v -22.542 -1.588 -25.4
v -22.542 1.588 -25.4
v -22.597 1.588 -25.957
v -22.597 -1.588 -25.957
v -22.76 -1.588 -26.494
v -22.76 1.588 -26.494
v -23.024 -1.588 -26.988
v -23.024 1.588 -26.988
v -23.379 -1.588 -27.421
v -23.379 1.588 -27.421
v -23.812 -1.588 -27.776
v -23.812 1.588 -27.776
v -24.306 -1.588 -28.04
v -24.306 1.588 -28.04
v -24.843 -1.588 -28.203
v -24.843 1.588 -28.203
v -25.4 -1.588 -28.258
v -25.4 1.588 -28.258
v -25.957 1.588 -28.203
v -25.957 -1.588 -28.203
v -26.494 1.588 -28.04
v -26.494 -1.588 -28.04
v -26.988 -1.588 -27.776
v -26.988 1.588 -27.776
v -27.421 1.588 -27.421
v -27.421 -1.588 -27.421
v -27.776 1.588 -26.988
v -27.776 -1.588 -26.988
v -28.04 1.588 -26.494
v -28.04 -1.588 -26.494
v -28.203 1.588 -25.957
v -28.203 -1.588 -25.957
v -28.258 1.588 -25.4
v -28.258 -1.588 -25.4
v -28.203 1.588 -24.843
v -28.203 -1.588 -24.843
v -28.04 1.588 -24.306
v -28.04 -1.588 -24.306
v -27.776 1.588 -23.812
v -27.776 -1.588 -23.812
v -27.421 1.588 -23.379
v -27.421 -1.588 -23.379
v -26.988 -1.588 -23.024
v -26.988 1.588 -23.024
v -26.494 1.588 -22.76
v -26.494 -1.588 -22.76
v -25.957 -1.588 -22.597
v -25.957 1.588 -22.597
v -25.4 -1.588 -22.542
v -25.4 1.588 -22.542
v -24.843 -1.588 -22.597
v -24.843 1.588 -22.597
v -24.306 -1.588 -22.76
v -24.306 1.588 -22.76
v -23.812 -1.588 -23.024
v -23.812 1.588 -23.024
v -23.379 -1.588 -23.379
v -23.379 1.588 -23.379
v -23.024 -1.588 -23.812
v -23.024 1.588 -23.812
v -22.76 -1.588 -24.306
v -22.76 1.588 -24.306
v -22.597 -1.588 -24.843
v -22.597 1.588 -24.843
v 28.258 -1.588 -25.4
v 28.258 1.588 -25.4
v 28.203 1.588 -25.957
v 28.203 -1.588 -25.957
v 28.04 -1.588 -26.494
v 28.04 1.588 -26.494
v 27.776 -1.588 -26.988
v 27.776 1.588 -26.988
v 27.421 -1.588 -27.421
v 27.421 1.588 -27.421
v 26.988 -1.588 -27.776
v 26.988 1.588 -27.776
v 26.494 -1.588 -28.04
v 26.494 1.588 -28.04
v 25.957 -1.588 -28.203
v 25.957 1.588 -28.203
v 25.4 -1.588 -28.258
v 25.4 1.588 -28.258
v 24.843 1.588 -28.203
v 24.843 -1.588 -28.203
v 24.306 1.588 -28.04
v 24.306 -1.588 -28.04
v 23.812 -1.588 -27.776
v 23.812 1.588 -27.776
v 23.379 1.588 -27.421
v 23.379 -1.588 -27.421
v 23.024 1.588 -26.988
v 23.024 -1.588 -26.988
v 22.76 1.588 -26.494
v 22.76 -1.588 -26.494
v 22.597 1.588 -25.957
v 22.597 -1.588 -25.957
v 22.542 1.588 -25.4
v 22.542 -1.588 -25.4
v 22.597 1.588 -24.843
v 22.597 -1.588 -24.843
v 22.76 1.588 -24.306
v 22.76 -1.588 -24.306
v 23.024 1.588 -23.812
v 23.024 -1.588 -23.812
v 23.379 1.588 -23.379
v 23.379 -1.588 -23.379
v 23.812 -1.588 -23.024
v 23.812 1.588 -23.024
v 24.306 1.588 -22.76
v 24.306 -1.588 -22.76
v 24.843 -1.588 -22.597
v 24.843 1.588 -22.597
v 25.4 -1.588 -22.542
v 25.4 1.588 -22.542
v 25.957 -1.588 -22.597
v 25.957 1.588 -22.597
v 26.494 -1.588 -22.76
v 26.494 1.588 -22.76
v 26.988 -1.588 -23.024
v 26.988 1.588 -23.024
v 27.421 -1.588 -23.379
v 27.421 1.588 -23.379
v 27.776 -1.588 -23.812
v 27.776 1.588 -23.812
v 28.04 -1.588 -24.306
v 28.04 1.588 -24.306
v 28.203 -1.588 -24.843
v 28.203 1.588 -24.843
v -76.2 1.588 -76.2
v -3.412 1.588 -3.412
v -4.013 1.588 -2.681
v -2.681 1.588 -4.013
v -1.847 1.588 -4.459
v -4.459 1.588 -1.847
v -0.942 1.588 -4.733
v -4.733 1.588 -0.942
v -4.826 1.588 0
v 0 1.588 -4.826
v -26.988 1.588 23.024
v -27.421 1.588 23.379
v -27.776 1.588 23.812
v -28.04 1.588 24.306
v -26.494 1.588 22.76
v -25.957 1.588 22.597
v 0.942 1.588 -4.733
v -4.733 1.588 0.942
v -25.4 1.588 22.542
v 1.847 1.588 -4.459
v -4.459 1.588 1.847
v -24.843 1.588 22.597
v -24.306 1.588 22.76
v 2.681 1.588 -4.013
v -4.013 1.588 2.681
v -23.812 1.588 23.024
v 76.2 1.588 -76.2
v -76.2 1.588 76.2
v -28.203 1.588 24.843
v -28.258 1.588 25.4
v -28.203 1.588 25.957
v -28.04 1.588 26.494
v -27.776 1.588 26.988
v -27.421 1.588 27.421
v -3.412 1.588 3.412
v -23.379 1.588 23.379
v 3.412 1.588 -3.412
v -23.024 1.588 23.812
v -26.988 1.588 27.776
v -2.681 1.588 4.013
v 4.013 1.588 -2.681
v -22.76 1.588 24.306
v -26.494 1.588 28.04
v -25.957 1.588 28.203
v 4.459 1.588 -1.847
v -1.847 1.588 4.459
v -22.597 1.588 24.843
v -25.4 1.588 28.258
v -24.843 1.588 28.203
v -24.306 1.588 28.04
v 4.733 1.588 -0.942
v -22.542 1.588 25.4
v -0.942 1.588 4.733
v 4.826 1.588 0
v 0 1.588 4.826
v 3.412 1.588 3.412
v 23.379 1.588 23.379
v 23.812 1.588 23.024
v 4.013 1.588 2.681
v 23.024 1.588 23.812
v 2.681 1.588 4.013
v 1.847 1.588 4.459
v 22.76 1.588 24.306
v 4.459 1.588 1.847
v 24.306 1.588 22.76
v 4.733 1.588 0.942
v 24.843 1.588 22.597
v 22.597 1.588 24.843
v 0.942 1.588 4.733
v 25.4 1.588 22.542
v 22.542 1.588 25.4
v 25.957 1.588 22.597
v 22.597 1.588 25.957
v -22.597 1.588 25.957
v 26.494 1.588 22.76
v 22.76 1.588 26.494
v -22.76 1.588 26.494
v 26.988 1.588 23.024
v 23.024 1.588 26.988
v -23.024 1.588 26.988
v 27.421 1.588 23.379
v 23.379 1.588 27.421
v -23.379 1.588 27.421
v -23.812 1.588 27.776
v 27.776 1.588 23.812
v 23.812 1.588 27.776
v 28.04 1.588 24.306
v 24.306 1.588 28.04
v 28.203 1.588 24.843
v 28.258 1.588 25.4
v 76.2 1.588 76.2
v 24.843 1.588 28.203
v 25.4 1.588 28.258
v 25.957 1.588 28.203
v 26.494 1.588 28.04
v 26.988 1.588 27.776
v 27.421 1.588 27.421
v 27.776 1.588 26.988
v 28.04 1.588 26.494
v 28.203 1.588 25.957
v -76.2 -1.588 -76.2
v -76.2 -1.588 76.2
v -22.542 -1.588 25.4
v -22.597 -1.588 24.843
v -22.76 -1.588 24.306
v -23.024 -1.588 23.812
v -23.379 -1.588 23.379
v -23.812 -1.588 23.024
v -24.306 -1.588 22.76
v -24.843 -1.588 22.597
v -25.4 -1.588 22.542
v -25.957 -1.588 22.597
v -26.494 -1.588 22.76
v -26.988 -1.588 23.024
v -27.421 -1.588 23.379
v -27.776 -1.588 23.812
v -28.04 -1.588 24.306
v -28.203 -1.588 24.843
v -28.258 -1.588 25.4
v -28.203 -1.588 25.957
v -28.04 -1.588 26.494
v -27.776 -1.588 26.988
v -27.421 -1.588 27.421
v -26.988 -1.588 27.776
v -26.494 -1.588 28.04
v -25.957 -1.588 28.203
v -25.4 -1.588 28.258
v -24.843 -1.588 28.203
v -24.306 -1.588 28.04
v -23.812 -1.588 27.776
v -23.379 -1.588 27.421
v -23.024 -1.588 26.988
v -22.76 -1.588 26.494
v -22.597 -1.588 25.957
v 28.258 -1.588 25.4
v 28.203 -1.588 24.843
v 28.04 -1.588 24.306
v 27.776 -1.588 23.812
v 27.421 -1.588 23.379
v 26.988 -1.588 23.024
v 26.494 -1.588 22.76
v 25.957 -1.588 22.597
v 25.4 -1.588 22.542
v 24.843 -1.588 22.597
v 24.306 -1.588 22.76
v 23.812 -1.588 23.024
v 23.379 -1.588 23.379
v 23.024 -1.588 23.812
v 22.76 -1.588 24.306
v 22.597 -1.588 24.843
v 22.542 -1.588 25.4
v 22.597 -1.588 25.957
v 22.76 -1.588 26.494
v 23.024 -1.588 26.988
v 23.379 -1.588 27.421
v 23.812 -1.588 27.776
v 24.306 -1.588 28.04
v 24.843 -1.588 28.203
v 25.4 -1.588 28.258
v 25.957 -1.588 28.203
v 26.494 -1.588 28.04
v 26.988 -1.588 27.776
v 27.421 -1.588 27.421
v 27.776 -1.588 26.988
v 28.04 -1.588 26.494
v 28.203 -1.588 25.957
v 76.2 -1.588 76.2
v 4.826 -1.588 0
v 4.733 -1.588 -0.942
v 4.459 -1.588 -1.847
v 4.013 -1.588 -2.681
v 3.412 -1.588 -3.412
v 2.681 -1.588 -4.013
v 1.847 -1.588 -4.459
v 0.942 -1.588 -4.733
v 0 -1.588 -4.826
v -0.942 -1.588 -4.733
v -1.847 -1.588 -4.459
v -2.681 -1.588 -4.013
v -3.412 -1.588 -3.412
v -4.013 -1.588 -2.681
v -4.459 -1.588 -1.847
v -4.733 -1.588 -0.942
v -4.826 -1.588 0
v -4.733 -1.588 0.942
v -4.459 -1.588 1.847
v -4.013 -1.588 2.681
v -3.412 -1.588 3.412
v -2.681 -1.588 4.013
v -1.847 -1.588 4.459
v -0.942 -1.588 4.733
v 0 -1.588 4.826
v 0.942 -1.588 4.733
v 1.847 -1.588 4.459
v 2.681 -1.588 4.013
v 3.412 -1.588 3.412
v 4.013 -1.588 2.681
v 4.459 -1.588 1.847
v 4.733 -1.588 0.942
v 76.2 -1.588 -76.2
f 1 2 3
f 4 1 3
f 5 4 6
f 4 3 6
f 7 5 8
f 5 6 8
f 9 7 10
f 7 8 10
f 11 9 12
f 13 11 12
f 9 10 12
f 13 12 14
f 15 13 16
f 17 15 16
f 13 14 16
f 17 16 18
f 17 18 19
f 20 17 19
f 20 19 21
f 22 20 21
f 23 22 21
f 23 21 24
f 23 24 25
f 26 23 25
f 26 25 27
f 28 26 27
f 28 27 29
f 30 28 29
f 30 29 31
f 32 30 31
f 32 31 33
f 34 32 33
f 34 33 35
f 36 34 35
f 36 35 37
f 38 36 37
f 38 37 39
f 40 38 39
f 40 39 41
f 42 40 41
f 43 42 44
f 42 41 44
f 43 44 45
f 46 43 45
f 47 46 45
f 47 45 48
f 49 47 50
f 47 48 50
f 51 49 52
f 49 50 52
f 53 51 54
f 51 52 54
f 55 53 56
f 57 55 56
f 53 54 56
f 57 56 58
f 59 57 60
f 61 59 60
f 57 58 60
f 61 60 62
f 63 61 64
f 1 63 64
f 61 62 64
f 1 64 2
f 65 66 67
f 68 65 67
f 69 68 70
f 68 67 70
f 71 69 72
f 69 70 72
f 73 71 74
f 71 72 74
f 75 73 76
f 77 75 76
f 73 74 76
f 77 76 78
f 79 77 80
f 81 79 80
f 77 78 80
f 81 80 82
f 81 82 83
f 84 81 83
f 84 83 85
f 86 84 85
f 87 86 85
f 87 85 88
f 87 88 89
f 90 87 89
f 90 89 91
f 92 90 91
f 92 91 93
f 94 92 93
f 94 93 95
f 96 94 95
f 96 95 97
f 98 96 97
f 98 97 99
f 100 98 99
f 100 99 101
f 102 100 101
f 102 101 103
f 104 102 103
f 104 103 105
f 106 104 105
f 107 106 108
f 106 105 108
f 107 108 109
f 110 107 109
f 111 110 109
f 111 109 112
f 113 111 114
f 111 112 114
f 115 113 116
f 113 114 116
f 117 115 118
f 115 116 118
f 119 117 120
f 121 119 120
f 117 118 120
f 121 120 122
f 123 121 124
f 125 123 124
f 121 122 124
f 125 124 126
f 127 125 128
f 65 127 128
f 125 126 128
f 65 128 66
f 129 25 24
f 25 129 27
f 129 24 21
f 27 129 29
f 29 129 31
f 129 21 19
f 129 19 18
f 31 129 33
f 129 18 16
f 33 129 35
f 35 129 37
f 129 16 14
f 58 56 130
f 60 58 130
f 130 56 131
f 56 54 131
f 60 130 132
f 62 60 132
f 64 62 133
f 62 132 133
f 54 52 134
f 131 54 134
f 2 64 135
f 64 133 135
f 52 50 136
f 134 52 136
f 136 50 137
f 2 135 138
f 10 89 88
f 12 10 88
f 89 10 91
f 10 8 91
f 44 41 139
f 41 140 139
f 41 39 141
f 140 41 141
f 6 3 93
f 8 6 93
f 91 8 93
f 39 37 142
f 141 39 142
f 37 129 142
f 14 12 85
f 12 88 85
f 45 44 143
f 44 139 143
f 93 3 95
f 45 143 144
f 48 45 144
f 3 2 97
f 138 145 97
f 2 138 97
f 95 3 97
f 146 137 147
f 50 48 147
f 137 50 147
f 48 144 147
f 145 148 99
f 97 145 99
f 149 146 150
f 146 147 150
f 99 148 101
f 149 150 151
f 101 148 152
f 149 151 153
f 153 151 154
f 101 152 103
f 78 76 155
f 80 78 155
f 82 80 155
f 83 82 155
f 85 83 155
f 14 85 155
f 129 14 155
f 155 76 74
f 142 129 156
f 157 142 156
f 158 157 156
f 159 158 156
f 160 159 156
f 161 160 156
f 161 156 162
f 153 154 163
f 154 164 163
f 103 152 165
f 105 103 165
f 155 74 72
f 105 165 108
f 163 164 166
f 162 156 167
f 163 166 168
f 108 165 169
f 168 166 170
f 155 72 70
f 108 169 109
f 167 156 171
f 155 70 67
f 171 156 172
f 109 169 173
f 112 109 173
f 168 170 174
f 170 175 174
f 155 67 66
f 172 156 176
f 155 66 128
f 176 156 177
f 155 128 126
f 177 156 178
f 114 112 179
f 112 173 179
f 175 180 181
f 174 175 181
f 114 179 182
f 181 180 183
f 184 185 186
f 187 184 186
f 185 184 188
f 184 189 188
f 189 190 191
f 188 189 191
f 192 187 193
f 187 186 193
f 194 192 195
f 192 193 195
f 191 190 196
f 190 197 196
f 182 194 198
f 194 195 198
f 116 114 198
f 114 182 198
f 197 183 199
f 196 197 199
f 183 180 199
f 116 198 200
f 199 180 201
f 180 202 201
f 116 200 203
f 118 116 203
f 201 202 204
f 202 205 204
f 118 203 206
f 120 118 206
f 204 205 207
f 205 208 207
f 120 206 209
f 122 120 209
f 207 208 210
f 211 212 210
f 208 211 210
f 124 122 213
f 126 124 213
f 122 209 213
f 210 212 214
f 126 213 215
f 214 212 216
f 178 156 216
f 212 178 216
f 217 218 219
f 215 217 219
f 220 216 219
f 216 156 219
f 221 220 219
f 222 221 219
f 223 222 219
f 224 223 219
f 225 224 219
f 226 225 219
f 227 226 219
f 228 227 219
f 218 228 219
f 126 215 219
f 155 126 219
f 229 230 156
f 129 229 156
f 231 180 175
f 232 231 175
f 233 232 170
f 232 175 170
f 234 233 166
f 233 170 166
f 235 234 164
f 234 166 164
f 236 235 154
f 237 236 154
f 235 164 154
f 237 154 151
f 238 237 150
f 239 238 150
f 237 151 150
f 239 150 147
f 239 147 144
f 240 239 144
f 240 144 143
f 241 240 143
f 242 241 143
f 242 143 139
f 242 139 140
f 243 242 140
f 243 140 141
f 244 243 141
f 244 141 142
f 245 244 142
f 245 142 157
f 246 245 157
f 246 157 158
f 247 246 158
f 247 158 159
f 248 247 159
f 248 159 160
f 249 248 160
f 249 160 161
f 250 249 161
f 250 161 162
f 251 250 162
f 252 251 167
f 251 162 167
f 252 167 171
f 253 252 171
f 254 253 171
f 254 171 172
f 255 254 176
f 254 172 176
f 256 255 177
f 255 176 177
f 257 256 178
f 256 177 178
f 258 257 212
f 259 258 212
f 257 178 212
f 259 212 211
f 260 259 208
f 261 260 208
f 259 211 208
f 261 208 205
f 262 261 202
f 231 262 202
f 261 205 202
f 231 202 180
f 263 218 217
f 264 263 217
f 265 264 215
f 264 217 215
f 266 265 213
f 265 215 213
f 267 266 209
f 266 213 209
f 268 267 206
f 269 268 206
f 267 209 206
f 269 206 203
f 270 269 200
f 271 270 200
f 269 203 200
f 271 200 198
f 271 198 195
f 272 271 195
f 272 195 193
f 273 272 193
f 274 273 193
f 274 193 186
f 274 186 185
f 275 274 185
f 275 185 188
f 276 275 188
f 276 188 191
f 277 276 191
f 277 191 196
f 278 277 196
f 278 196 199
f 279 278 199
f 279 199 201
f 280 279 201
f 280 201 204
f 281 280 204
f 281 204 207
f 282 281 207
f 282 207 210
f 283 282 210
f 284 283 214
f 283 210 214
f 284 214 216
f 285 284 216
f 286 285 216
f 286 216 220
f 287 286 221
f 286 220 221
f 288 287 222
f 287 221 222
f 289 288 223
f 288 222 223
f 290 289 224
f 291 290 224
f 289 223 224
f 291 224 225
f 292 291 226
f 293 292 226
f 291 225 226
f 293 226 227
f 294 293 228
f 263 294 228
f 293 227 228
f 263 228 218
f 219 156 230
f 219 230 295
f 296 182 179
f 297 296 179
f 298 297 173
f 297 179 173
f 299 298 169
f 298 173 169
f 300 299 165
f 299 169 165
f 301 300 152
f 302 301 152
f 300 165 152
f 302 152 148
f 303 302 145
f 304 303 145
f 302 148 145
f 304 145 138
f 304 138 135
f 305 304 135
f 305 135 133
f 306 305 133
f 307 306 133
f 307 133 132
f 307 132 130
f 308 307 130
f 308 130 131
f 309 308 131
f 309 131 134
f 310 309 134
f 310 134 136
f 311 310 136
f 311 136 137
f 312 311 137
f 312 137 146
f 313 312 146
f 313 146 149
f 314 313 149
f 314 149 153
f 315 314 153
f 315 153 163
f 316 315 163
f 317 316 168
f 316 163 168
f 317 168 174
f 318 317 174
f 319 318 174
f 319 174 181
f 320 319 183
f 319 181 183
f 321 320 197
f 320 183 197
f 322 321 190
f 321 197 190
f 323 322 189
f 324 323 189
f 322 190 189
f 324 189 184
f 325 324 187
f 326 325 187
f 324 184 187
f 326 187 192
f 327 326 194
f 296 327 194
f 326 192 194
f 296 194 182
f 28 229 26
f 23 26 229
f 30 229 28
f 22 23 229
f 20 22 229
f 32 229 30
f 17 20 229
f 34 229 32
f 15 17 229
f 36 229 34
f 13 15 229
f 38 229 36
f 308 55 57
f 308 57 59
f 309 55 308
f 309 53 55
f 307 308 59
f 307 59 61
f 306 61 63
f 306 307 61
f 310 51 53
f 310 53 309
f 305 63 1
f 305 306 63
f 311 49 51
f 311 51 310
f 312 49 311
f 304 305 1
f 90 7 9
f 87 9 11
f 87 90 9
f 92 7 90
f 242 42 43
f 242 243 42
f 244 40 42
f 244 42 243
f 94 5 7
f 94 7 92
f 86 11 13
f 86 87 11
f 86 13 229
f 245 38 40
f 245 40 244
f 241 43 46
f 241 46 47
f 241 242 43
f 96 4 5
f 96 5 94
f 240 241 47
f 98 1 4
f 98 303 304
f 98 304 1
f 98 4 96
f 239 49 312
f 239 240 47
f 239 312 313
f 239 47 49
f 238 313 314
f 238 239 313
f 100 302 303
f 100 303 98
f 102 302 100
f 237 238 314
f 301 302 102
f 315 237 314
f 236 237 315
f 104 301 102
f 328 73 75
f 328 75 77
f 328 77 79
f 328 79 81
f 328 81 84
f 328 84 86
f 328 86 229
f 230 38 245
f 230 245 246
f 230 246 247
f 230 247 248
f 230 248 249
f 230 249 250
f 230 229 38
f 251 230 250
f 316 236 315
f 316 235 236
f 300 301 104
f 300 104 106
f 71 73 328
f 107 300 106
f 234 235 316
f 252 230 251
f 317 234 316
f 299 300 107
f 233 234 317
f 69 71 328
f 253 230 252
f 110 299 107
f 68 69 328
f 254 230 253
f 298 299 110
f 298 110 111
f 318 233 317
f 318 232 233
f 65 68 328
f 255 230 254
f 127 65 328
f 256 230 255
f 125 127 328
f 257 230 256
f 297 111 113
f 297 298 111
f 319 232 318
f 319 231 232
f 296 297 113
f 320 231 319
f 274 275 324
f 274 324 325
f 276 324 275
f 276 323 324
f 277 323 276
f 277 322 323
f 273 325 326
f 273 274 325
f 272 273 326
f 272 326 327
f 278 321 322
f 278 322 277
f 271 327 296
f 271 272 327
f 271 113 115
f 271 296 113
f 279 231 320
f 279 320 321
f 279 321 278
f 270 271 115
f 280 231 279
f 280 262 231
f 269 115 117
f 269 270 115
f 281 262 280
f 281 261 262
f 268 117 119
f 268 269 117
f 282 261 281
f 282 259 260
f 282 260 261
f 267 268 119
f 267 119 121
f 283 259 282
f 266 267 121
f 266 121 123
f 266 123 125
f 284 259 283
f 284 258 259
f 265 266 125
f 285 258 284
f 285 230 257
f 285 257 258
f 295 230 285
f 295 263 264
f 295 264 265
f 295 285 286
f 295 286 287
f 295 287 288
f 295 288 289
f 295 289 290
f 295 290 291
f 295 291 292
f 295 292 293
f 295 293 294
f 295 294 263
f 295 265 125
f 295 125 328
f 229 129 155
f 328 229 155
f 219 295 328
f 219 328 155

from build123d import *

# Parameters (mm, degrees)
SKETCH1_W           = 152.4
SKETCH1_H           = 3.175
BOSS_EXTRUDE1_DEPTH = 76.2
SKETCH2_R           = 2.8575
SKETCH2_R_2         = 4.826
CUT_EXTRUDE1_DEPTH  = 4.175


with BuildPart() as part:
    # Sketch1 → Boss-Extrude1 (new body, symmetric)
    with BuildSketch(Plane.XY):
        Rectangle(SKETCH1_W, SKETCH1_H)
    extrude(amount=BOSS_EXTRUDE1_DEPTH, both=True)

    # Sketch2 → Cut-Extrude1 (cut, through all)
    with BuildSketch(Plane(origin=(0, 1.5875, 0), x_dir=(1, 0, 0), z_dir=(0, 1, 0))):
        with Locations((-25.4, 25.4)):
            Circle(SKETCH2_R)
        with Locations((25.4, 25.4)):
            Circle(SKETCH2_R)
        with Locations((25.4, -25.4)):
            Circle(SKETCH2_R)
        with Locations((-25.4, -25.4)):
            Circle(SKETCH2_R)
        Circle(SKETCH2_R_2)
    extrude(amount=-CUT_EXTRUDE1_DEPTH, mode=Mode.SUBTRACT)


solid = part.part
